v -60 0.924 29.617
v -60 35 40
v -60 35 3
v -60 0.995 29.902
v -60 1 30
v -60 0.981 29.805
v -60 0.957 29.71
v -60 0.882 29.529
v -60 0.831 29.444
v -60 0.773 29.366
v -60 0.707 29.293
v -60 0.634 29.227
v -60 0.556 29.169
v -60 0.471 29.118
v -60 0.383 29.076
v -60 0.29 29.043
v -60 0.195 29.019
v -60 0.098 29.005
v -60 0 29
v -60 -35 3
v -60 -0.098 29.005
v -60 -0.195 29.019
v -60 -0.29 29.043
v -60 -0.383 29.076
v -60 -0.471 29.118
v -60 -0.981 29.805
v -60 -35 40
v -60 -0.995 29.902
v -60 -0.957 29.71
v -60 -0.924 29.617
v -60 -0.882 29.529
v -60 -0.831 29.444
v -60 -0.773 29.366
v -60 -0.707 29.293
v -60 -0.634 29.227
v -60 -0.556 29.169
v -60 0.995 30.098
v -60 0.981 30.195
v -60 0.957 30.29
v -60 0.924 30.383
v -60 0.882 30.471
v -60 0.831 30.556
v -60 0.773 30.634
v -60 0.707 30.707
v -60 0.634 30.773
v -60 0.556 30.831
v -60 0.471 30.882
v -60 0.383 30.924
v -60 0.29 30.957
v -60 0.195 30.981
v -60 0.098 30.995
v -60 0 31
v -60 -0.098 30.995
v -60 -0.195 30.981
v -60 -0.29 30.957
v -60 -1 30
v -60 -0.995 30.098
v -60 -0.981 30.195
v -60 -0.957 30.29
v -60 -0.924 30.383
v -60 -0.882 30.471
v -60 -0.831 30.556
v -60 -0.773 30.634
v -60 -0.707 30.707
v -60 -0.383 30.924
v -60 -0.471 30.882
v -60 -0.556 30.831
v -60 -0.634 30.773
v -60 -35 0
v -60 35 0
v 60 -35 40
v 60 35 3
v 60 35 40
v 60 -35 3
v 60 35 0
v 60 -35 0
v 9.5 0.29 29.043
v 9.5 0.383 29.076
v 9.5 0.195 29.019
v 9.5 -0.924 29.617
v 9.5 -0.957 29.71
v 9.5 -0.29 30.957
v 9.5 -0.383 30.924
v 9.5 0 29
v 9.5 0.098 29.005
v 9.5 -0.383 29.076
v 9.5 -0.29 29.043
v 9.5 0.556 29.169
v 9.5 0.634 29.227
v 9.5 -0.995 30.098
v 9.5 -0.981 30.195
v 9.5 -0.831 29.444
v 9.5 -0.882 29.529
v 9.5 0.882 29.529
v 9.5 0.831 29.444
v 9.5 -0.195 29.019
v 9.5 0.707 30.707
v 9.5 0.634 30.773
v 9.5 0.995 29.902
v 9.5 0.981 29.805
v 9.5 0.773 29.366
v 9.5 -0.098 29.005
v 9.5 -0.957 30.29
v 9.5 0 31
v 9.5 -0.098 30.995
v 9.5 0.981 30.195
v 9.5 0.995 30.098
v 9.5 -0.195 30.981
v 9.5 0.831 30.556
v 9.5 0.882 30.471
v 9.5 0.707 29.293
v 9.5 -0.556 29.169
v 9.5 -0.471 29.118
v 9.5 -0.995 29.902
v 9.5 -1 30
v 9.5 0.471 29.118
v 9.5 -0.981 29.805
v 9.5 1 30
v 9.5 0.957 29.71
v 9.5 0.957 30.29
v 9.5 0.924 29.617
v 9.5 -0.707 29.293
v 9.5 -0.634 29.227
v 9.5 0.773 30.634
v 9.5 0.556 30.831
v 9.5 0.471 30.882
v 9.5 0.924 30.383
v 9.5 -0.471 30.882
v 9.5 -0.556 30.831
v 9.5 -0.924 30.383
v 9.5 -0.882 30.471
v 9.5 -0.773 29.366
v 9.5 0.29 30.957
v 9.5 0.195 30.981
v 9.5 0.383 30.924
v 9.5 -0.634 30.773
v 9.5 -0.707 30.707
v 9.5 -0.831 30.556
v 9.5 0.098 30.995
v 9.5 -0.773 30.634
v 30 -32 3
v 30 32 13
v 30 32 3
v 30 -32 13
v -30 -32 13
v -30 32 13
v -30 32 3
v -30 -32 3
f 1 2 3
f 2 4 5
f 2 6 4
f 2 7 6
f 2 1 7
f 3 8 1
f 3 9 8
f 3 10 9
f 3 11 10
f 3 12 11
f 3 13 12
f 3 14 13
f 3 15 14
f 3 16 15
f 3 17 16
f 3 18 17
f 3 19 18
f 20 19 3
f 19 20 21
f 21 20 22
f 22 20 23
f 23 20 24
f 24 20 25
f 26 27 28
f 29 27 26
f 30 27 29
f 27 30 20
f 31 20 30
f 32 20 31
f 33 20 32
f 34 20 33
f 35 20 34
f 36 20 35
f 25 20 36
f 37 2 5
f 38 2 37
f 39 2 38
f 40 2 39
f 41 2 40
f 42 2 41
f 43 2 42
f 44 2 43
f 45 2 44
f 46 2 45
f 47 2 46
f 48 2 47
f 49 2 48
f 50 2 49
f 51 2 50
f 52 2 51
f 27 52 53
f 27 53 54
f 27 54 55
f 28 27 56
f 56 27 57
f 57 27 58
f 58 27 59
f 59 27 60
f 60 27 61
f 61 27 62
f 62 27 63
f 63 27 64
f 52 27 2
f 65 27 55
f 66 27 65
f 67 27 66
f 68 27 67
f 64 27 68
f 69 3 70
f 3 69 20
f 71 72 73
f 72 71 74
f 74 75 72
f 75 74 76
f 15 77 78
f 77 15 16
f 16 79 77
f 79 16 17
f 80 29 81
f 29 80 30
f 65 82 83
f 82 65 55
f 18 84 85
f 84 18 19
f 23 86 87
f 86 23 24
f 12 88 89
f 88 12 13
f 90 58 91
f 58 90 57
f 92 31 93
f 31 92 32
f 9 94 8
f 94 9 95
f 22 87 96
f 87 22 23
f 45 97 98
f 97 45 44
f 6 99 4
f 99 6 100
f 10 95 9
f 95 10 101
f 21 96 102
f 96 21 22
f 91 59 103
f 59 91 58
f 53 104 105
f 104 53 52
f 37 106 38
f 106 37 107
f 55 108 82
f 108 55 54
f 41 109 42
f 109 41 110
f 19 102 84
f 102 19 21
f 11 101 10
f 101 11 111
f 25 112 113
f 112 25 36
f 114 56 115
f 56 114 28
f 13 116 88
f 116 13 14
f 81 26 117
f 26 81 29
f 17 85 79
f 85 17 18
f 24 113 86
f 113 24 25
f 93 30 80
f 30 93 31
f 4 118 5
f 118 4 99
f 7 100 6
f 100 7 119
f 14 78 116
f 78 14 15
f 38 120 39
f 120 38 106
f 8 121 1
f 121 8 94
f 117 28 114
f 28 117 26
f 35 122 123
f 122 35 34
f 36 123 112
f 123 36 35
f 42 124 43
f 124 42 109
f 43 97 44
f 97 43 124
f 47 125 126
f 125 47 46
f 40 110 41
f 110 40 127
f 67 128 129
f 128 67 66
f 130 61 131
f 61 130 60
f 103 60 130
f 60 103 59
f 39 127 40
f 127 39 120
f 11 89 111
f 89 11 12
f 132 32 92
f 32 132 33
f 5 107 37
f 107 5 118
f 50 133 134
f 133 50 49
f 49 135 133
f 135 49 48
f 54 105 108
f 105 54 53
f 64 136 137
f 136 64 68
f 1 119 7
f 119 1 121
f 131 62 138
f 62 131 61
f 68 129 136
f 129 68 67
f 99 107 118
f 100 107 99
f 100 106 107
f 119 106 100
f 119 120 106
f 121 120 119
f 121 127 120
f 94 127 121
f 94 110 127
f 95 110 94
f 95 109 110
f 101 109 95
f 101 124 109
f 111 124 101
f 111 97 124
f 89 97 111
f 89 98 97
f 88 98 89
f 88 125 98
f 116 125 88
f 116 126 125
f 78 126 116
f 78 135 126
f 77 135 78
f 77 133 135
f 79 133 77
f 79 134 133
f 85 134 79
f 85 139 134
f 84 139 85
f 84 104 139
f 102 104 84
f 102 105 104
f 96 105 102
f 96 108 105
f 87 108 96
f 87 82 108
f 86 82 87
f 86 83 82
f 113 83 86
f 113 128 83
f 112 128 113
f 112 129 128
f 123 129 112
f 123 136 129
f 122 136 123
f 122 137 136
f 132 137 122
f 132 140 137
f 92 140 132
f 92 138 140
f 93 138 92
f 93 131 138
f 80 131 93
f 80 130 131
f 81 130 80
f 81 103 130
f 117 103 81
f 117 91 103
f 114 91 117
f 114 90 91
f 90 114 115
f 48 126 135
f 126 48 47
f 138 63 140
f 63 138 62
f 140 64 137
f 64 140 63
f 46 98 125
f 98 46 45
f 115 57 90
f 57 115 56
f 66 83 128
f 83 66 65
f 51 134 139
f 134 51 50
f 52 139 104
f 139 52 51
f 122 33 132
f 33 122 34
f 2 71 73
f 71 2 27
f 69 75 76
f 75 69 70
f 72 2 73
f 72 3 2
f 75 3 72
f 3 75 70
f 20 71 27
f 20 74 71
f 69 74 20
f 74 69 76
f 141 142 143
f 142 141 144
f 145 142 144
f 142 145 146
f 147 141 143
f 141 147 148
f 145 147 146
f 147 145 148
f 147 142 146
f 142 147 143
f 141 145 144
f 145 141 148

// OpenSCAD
// Buffer tank for mini horizontal gel-electrophoresis box
// Print orientation: open top facing +Z, resting on XY plane at z = 0

// ---------------- Parameters ----------------
outer_x   = 120;   // outer length (X)
outer_y   = 70;    // outer width (Y)
outer_z   = 40;    // outer height (Z)
wall      = 3;     // wall thickness
floor     = 3;     // floor thickness

inner_x   = outer_x - 2*wall;   // 114
inner_y   = outer_y - 2*wall;   // 64
inner_z   = outer_z - floor;    // 37  (inner floor at z = floor)

platform_x = 60;    // platform length in X (centred)
platform_top_z = 13; // top of platform, above inner floor (floor + 10)
platform_h  = platform_top_z - floor; // 10 mm above inner floor

hole_d     = 2;     // electrode hole diameter
hole_y     = 0;     // hole Y position
hole_z     = 30;    // hole Z position (above floor)

eps        = 0.5;   // cutter overshoot past faces

$fn = 64;

// ---------------- Model ----------------
difference() {
    // Tank body (open top)
    translate([-outer_x/2, -outer_y/2, 0])
        cube([outer_x, outer_y, outer_z]);

    // Cut out the two end chambers below the platform (through the full Y)
    for (sx = [-1, 1])
        translate([sx < 0 ? -outer_x/2 - eps : outer_x/2, -outer_y/2, floor])
            cube([eps, outer_y, outer_z - floor]);

    // Raised platform for gel tray
    translate([-platform_x/2, -inner_y/2, floor])
        cube([platform_x, inner_y, platform_h]);

    // Horizontal electrode holes through each end wall along X
    for (x = [-outer_x/2 - hole_d/2 - eps, outer_x/2 + hole_d/2 + eps])
        translate([x, hole_y, hole_z])
            rotate([0, 90, 0])
                cylinder(d = hole_d, h = outer_y + 2*eps);
}
